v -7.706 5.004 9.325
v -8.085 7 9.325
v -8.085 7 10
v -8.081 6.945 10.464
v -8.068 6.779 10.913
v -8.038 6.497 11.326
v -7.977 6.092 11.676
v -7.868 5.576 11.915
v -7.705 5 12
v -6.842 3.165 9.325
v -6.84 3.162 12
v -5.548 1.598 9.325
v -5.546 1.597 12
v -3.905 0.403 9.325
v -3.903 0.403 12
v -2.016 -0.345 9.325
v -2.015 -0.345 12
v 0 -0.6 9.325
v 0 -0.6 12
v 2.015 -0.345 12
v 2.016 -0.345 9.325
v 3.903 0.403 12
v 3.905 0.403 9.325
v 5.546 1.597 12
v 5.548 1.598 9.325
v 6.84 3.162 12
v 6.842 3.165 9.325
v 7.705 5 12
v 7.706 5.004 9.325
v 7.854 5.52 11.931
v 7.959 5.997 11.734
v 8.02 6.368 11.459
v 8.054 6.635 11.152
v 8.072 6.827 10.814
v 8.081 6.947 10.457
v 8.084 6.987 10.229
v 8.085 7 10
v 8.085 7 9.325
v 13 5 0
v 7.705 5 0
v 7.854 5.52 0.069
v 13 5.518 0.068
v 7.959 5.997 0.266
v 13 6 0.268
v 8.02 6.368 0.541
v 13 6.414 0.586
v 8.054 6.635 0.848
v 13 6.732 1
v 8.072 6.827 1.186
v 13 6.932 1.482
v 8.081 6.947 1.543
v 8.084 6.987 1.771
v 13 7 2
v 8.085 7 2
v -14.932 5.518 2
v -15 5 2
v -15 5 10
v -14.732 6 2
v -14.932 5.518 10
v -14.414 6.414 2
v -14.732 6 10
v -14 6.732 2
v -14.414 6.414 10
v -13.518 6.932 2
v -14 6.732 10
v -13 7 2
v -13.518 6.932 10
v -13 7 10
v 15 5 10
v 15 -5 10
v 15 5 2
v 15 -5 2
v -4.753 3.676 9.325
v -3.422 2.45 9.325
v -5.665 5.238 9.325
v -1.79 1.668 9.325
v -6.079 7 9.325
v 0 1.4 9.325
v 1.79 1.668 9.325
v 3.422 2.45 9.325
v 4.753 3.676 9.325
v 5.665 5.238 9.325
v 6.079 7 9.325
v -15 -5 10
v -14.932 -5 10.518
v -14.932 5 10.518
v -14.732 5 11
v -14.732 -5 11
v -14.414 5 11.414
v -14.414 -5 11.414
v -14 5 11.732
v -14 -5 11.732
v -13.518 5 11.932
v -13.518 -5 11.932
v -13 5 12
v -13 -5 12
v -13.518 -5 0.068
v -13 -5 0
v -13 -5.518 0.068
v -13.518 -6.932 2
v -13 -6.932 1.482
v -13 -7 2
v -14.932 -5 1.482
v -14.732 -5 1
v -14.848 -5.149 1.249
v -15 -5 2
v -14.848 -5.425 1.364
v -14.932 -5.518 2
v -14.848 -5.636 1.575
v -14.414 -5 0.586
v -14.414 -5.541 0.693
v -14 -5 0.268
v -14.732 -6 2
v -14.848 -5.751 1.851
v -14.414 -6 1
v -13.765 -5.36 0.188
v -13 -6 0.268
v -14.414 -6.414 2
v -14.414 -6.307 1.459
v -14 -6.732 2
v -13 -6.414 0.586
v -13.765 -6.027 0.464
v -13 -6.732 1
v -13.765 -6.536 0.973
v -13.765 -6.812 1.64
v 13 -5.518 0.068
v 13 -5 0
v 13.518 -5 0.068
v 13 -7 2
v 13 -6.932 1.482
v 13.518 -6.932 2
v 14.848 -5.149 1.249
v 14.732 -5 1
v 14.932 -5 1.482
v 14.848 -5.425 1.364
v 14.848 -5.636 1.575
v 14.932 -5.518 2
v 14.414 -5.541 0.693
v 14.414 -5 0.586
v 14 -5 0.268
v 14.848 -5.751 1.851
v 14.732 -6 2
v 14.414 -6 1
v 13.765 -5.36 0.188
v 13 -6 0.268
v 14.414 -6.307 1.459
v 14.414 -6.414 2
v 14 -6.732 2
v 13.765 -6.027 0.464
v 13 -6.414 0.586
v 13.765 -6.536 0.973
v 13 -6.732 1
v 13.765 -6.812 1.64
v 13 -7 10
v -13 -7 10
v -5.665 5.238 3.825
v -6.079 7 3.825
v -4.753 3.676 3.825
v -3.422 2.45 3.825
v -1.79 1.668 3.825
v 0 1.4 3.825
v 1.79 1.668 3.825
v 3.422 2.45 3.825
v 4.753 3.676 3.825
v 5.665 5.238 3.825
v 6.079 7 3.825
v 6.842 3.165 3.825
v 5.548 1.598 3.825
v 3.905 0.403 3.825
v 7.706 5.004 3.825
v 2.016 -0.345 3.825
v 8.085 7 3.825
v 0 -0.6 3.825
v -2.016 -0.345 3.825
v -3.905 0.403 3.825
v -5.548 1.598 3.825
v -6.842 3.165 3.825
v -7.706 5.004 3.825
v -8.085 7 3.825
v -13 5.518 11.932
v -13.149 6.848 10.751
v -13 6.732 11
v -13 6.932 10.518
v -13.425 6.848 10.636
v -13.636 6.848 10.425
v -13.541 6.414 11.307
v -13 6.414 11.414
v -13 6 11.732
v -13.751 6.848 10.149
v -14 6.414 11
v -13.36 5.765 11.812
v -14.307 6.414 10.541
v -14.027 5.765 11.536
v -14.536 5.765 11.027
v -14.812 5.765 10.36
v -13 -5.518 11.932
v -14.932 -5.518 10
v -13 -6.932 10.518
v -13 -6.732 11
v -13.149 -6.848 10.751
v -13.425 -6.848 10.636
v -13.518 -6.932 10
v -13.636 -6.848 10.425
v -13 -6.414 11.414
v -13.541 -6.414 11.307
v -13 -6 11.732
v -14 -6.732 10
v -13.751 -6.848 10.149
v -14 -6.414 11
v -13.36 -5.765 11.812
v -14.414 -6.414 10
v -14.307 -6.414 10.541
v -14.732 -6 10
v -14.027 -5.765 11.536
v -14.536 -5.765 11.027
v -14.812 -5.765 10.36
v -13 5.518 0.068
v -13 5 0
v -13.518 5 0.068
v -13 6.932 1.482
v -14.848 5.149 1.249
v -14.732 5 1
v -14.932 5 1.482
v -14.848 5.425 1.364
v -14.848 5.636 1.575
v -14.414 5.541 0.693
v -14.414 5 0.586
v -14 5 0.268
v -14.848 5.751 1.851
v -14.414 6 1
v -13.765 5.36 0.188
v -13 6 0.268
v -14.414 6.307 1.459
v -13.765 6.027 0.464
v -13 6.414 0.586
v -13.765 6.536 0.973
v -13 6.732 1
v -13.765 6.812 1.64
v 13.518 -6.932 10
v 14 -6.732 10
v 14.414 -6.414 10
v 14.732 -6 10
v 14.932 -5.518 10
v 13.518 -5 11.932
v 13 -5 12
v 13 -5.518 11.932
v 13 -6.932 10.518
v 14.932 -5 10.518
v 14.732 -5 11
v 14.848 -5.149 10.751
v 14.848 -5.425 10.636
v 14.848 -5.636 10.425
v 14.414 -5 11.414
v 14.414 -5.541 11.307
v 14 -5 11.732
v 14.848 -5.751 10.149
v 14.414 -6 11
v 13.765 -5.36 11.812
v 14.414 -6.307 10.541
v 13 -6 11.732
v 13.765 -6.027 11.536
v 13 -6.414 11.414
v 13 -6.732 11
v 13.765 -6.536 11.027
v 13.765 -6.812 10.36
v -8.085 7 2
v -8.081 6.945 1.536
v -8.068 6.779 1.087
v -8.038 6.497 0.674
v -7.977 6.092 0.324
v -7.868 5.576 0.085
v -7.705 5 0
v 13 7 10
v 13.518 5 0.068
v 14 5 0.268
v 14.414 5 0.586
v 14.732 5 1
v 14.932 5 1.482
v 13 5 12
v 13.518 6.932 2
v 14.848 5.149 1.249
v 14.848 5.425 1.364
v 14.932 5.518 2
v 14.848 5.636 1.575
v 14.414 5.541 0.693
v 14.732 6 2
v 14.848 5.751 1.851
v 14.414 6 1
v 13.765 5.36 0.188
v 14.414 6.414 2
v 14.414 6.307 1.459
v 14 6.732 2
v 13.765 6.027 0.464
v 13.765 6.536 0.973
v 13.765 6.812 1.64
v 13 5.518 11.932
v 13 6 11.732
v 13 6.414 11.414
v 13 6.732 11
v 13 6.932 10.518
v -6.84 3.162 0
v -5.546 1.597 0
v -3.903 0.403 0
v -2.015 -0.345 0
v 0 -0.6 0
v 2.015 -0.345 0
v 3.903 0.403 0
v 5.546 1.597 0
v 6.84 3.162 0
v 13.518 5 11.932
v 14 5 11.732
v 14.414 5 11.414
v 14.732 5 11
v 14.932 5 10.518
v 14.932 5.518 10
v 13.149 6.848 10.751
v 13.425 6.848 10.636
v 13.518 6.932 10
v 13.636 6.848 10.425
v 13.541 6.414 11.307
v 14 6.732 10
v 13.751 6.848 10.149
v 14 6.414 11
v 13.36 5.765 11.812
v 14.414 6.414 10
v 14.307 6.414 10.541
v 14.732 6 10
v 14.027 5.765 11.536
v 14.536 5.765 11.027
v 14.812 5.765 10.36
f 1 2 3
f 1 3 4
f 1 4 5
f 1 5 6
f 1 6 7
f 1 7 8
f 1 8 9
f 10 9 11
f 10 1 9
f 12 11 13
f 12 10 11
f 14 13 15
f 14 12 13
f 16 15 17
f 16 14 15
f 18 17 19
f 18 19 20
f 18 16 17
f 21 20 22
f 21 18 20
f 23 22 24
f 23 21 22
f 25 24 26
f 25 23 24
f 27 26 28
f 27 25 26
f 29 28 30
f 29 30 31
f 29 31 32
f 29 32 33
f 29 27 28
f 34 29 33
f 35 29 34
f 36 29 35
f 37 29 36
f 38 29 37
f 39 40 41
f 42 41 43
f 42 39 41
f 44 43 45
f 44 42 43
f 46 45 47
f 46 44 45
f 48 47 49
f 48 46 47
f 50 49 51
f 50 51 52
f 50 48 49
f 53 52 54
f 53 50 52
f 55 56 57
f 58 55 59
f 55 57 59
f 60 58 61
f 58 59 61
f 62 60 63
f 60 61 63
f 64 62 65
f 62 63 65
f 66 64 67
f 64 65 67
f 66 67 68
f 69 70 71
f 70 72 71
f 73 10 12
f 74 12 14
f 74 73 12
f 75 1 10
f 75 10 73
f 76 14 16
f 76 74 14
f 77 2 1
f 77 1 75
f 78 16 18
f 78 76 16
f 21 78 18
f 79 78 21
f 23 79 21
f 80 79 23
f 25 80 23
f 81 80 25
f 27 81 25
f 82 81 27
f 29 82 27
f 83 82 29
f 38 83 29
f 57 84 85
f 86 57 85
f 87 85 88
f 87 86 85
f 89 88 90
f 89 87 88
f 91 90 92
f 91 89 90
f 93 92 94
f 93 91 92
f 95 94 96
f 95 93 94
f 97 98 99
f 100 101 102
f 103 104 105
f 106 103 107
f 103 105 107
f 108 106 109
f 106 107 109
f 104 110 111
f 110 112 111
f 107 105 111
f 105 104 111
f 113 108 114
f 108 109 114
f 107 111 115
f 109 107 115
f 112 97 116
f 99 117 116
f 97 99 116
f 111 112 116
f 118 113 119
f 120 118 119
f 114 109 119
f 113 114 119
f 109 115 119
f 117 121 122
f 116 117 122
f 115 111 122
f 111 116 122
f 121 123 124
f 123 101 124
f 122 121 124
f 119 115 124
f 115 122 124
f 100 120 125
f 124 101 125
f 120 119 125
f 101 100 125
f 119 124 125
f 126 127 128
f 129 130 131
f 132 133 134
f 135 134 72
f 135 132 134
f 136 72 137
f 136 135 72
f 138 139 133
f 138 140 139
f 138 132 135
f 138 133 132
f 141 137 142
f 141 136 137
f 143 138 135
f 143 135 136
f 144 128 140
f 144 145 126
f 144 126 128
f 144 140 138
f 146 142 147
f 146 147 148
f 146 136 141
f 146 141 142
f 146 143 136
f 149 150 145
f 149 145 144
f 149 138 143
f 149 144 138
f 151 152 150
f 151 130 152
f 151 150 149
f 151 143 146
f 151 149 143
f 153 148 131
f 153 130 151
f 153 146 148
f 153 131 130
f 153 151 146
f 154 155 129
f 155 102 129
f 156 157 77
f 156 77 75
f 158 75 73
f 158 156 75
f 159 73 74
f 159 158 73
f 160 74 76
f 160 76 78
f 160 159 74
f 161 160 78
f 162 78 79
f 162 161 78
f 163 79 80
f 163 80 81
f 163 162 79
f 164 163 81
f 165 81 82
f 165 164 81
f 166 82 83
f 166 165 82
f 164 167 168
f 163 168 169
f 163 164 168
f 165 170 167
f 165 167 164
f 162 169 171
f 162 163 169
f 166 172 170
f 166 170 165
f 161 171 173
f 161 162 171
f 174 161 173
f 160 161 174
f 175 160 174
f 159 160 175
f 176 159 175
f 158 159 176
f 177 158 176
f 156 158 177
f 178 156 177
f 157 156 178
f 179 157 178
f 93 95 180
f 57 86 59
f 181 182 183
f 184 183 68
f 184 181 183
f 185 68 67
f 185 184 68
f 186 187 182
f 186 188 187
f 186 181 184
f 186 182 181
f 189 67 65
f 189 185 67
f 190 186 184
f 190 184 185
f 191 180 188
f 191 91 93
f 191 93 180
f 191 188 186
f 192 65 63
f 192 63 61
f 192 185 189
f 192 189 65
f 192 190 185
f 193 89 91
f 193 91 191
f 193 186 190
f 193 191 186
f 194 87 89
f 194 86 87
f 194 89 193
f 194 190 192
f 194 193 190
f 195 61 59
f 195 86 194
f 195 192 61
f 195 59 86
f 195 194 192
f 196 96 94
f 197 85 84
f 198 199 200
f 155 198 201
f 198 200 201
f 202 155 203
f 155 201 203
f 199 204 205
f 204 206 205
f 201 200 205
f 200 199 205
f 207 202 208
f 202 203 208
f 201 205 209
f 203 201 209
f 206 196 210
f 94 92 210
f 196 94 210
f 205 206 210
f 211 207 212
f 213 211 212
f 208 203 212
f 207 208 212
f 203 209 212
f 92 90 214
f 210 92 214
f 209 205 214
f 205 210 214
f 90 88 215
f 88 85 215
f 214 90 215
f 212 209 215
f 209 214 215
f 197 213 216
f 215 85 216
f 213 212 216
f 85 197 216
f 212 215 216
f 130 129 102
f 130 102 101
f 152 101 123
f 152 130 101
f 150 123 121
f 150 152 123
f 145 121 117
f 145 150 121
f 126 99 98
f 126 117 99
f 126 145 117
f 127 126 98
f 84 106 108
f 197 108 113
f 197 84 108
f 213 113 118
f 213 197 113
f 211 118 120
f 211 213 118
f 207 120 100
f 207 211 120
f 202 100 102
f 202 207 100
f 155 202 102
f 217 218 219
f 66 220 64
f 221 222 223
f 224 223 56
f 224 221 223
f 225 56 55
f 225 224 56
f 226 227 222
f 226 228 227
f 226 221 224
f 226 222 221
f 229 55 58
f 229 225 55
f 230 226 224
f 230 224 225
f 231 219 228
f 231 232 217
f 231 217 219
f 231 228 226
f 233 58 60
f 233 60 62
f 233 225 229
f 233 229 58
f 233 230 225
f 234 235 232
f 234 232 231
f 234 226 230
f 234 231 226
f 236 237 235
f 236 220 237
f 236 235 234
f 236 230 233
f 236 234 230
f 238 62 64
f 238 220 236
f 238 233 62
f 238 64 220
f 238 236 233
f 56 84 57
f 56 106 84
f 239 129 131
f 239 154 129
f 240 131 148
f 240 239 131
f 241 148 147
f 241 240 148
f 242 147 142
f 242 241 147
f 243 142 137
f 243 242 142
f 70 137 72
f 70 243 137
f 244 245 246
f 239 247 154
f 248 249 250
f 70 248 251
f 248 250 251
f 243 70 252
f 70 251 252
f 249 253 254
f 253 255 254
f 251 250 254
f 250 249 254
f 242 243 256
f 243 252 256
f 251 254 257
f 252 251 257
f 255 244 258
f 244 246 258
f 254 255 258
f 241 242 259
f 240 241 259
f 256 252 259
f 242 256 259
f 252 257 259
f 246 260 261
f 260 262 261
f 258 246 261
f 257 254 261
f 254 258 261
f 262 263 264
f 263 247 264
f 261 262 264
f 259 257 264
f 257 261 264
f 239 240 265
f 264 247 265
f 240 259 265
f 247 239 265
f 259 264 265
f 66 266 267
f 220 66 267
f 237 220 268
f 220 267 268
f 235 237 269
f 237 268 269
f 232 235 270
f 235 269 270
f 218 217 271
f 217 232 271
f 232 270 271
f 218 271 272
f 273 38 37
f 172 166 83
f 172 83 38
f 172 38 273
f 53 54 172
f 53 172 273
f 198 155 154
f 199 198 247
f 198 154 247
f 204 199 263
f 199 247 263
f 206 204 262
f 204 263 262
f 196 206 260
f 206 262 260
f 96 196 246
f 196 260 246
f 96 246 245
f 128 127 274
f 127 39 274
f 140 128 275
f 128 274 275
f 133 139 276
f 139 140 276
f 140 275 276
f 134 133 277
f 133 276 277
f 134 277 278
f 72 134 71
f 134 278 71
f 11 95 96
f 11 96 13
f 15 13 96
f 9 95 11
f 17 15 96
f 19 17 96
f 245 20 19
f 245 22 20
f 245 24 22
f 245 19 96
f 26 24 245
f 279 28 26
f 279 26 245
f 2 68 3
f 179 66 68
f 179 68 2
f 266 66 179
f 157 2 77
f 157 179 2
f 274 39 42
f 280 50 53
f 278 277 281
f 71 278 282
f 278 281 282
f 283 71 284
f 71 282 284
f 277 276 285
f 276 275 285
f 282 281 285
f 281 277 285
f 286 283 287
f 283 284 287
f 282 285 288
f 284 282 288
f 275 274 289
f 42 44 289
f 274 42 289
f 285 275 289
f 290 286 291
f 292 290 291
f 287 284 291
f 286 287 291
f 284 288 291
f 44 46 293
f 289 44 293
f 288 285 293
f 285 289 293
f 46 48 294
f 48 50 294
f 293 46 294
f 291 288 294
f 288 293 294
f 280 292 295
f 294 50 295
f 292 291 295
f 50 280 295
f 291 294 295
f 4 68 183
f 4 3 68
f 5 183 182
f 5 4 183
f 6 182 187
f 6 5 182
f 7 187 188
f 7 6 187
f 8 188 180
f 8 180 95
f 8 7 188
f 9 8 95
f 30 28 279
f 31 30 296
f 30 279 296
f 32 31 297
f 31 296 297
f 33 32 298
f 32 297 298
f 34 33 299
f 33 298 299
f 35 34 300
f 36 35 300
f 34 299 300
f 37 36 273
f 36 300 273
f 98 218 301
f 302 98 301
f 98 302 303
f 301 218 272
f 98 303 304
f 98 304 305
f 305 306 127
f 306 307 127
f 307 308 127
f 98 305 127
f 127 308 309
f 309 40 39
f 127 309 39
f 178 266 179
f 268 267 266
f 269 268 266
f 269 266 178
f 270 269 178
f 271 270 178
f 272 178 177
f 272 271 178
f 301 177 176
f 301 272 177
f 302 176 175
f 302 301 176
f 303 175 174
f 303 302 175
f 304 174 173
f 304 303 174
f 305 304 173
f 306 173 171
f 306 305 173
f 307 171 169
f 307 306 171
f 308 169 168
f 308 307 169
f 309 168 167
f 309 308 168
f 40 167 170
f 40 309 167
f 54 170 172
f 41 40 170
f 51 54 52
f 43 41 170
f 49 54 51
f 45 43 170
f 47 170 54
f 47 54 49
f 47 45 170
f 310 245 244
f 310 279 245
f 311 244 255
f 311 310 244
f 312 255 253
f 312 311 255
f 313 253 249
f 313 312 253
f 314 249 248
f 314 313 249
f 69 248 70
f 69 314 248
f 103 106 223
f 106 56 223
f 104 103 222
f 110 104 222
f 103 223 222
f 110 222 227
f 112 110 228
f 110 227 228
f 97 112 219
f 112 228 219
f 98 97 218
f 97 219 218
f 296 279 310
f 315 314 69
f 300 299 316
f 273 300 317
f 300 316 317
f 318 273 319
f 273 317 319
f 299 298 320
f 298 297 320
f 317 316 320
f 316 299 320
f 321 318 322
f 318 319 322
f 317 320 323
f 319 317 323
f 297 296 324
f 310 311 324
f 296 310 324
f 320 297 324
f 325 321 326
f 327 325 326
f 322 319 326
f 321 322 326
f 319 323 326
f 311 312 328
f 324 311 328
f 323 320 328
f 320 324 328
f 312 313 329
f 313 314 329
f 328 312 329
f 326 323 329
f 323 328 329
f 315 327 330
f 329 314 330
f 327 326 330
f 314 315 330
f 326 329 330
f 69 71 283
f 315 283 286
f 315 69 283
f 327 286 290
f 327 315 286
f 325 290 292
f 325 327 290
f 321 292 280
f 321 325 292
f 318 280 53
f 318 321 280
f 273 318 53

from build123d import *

# Parameters (mm, degrees)
SKETCH_1_W      = 30
SKETCH_1_H      = 14
EXTRUDE_1_DEPTH = 12
FILLET_1_R      = 2


with BuildPart() as part:
    # Эскиз1 → Бобышка-Вытянуть1 (new body)
    with BuildSketch(Plane.XY):
        Rectangle(SKETCH_1_W, SKETCH_1_H)
    extrude(amount=EXTRUDE_1_DEPTH)

    # Эскиз2 → Вырез-Повернуть1 (revolve, cut)
    with BuildSketch(Plane(origin=(0, 7.5, 0), x_dir=(1, 0, 0), z_dir=(0, 1, 0))):
        Polygon((0, 0), (0, -12), (8.1, -12), (8.1, -9.325), (6.1, -9.325), (6.1, -3.825), (8.1, -3.825), (8.1, 0), align=None)
    revolve(axis=Axis((0, 7.5, -4.413755415), (0, 0, 1)), mode=Mode.SUBTRACT)

    # Скругление1
    fillet_1_edges = [part.edges().sort_by_distance(p)[0] for p in [
        (-15, 0, 12),
        (0, -7, 12),
        (-11.542276586, 7, 0),
        (-11.542276586, 7, 12),
        (15, 0, 12),
        (0, -7, 0),
        (-15, 0, 0),
        (11.542276586, 7, 0),
        (15, 0, 0),
        (11.542276586, 7, 12),
        (15, -7, 6),
        (-15, -7, 6),
        (-15, 7, 6),
        (15, 7, 6),
    ]]
    fillet(fillet_1_edges, radius=FILLET_1_R)


solid = part.part
